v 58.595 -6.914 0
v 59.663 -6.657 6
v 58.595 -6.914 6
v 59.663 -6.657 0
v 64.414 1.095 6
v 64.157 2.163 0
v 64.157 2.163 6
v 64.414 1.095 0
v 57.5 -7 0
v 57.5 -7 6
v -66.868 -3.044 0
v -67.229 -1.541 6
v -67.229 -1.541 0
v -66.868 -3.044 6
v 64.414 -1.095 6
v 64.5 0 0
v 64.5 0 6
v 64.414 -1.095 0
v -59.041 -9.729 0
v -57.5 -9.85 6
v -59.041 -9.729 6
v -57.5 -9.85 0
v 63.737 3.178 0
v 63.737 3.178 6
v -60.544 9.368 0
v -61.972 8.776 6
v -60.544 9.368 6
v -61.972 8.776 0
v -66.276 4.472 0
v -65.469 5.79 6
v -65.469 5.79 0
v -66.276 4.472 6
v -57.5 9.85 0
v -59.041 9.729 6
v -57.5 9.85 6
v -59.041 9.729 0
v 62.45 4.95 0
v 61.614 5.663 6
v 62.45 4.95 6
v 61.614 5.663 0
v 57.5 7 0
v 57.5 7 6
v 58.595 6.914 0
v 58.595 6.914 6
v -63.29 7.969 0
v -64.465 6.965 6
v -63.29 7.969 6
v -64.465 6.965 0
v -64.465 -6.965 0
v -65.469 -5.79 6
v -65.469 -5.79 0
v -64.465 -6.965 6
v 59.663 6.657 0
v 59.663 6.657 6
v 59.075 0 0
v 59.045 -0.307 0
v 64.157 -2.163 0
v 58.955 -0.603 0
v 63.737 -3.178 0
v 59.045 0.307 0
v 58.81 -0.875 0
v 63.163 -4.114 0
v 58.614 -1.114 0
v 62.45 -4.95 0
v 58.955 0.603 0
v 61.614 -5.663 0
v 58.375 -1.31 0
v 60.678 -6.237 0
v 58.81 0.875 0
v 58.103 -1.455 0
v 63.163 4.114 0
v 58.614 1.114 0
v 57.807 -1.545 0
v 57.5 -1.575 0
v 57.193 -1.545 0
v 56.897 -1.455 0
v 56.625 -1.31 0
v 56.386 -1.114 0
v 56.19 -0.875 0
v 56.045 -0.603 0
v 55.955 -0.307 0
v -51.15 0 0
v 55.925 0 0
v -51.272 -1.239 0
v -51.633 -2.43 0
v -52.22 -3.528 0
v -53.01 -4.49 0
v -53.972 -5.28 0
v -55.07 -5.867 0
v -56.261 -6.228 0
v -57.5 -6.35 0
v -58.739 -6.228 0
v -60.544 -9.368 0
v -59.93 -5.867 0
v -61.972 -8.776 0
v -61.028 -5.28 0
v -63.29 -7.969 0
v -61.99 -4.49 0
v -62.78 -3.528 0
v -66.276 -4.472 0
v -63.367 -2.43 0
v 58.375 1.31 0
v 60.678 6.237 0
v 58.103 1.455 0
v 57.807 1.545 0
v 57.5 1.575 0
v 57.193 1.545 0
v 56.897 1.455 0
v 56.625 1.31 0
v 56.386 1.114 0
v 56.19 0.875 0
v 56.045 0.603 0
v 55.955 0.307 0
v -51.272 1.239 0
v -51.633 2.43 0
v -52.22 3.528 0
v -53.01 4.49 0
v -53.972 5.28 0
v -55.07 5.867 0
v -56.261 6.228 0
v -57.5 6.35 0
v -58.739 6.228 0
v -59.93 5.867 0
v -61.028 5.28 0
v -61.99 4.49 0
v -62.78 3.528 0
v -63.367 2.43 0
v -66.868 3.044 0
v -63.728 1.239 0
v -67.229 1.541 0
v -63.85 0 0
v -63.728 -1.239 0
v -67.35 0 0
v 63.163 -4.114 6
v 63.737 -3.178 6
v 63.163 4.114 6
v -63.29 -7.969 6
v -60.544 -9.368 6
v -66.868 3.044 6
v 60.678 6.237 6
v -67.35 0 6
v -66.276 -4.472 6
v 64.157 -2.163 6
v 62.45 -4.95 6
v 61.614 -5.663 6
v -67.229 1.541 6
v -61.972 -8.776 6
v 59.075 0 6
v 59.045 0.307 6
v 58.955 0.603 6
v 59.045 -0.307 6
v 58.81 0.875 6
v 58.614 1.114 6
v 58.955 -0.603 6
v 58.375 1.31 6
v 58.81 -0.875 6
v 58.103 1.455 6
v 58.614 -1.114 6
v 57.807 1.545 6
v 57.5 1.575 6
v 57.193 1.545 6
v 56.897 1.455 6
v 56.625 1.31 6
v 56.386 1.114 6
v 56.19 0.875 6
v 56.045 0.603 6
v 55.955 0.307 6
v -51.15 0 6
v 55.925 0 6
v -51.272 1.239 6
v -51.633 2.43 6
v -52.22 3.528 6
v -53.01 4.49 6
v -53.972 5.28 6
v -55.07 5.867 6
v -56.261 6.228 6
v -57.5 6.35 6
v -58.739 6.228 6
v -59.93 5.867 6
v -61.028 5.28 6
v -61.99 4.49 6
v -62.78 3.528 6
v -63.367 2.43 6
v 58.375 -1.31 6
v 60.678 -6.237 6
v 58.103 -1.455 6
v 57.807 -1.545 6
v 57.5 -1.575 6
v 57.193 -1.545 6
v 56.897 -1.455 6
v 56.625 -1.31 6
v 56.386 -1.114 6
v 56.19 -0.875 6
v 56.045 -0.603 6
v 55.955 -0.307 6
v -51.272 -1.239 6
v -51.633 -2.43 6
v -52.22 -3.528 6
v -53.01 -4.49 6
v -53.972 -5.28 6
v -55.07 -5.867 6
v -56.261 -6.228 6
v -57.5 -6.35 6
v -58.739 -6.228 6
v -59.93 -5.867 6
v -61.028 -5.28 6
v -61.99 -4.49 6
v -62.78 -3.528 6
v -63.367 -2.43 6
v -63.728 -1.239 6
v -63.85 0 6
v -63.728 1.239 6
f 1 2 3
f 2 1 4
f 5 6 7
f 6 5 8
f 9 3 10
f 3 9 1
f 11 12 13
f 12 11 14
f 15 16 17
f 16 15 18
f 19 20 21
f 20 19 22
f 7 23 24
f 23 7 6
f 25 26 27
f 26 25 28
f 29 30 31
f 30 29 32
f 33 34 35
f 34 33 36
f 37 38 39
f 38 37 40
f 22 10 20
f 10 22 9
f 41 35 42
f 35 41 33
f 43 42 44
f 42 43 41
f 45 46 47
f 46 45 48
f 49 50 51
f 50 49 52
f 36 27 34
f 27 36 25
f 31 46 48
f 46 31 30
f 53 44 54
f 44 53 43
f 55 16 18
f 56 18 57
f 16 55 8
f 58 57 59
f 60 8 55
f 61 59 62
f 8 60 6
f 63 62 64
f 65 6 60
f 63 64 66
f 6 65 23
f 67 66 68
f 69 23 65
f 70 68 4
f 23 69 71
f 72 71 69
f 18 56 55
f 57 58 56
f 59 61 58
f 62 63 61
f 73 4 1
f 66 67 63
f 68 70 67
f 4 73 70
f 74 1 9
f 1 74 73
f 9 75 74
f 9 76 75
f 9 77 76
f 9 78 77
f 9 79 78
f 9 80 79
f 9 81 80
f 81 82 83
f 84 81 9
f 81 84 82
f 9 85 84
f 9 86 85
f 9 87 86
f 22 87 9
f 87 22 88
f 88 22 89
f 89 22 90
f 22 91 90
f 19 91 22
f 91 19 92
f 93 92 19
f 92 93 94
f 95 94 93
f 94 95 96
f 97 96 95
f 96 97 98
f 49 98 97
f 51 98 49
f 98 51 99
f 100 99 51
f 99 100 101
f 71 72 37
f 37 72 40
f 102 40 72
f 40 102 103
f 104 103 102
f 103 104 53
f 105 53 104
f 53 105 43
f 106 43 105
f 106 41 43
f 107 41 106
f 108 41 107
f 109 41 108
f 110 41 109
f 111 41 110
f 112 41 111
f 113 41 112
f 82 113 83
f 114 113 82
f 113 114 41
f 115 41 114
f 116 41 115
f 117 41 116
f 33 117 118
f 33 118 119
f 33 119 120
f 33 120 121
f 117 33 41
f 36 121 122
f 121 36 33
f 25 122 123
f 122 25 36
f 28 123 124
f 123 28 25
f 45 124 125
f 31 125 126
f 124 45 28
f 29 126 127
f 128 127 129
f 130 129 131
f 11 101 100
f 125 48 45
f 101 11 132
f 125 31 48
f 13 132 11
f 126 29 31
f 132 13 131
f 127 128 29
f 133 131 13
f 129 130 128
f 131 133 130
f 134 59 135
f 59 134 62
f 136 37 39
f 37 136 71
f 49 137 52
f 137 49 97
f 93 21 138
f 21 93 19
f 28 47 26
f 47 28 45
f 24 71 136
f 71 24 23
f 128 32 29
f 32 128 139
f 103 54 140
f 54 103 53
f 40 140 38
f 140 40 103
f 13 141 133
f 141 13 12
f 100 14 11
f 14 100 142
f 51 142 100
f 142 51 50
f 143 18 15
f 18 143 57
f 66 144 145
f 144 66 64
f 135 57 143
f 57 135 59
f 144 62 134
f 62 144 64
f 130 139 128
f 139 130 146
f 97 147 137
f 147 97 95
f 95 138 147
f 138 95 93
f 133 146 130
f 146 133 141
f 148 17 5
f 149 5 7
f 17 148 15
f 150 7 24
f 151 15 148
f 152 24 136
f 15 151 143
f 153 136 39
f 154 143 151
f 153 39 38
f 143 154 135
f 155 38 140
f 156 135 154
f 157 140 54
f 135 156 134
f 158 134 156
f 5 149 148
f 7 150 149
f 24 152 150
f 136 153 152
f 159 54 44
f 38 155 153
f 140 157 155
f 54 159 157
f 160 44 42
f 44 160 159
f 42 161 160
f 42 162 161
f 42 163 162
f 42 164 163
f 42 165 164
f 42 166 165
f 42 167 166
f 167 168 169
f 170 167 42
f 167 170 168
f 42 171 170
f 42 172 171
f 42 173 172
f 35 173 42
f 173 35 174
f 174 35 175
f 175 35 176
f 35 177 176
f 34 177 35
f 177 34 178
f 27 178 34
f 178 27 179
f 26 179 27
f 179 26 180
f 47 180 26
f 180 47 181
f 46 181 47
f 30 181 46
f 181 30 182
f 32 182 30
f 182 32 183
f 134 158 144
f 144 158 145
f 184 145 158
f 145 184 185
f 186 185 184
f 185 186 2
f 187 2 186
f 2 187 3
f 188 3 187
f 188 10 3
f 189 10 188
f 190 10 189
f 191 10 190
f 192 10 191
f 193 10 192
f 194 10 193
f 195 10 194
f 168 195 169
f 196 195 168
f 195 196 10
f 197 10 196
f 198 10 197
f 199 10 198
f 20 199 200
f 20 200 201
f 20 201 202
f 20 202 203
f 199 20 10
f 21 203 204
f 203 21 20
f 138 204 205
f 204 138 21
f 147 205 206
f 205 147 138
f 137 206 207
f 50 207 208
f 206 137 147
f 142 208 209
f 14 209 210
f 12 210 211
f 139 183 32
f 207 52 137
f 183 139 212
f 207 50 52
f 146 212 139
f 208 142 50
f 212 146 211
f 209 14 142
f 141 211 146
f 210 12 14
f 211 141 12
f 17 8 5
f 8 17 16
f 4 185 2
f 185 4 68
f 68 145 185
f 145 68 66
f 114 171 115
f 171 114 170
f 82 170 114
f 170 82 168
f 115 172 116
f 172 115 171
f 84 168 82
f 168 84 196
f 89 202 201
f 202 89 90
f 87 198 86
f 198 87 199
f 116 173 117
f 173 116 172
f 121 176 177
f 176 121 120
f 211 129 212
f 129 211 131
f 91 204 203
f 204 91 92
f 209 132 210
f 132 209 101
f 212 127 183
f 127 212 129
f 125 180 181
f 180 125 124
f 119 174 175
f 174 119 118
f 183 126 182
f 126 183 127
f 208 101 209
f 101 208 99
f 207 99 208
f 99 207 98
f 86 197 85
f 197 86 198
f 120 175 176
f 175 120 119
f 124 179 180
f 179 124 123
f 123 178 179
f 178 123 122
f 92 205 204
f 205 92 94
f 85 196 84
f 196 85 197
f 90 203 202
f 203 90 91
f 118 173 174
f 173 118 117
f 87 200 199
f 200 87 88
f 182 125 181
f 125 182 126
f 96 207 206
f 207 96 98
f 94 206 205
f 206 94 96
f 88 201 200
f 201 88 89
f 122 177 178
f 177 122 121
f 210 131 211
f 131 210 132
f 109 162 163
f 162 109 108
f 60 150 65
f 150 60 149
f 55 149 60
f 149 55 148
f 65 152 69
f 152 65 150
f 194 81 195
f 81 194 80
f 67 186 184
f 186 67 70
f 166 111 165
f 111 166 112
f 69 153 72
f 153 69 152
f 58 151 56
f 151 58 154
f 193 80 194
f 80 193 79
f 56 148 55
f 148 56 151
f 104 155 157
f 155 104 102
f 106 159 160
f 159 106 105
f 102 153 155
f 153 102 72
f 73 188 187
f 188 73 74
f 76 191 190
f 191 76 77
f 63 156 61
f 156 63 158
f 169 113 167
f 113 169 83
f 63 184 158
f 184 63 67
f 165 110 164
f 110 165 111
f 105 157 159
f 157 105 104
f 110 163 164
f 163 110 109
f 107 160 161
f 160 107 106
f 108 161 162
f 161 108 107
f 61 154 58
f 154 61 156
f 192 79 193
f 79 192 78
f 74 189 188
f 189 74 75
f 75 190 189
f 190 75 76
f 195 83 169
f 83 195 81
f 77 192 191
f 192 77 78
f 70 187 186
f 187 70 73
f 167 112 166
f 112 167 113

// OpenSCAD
$fn = 32;

// ----------------------------------------------------------------------
// Lever: 115 mm between the bosses, 6 mm thick, smooth outline
// ----------------------------------------------------------------------

// --- parameters (mm) ---
lever_l = 115;            // distance between the boss centres
boss_a = 19.7;            // first boss diameter
boss_b = 14;              // second boss diameter
bore_a = 12.7;            // first bore
bore_b = 3.15;            // second bore
lever_t = 6;              // lever thickness

lever_profile = [[-67.35, 0], [-67.229, -1.541], [-66.868, -3.044], [-66.276, -4.472], [-65.469, -5.79], [-64.465, -6.965], [-63.29, -7.969], [-61.972, -8.776], [-60.544, -9.368], [-59.041, -9.729], [-57.5, -9.85], [57.5, -7], [58.595, -6.914], [59.663, -6.657], [60.678, -6.237], [61.614, -5.663], [62.45, -4.95], [63.163, -4.114], [63.737, -3.178], [64.157, -2.163], [64.414, -1.095], [64.5, 0], [64.414, 1.095], [64.157, 2.163], [63.737, 3.178], [63.163, 4.114], [62.45, 4.95], [61.614, 5.663], [60.678, 6.237], [59.663, 6.657], [58.595, 6.914], [57.5, 7], [-57.5, 9.85], [-59.041, 9.729], [-60.544, 9.368], [-61.972, 8.776], [-63.29, 7.969], [-64.465, 6.965], [-65.469, 5.79], [-66.276, 4.472], [-66.868, 3.044], [-67.229, 1.541]];

difference() {
  linear_extrude(height = lever_t) polygon(lever_profile);
  translate([-57.5, 0, -2.5]) cylinder(h = lever_t + 5, d = bore_a);
  translate([57.5, 0, -2.5]) cylinder(h = lever_t + 5, d = bore_b);
}
